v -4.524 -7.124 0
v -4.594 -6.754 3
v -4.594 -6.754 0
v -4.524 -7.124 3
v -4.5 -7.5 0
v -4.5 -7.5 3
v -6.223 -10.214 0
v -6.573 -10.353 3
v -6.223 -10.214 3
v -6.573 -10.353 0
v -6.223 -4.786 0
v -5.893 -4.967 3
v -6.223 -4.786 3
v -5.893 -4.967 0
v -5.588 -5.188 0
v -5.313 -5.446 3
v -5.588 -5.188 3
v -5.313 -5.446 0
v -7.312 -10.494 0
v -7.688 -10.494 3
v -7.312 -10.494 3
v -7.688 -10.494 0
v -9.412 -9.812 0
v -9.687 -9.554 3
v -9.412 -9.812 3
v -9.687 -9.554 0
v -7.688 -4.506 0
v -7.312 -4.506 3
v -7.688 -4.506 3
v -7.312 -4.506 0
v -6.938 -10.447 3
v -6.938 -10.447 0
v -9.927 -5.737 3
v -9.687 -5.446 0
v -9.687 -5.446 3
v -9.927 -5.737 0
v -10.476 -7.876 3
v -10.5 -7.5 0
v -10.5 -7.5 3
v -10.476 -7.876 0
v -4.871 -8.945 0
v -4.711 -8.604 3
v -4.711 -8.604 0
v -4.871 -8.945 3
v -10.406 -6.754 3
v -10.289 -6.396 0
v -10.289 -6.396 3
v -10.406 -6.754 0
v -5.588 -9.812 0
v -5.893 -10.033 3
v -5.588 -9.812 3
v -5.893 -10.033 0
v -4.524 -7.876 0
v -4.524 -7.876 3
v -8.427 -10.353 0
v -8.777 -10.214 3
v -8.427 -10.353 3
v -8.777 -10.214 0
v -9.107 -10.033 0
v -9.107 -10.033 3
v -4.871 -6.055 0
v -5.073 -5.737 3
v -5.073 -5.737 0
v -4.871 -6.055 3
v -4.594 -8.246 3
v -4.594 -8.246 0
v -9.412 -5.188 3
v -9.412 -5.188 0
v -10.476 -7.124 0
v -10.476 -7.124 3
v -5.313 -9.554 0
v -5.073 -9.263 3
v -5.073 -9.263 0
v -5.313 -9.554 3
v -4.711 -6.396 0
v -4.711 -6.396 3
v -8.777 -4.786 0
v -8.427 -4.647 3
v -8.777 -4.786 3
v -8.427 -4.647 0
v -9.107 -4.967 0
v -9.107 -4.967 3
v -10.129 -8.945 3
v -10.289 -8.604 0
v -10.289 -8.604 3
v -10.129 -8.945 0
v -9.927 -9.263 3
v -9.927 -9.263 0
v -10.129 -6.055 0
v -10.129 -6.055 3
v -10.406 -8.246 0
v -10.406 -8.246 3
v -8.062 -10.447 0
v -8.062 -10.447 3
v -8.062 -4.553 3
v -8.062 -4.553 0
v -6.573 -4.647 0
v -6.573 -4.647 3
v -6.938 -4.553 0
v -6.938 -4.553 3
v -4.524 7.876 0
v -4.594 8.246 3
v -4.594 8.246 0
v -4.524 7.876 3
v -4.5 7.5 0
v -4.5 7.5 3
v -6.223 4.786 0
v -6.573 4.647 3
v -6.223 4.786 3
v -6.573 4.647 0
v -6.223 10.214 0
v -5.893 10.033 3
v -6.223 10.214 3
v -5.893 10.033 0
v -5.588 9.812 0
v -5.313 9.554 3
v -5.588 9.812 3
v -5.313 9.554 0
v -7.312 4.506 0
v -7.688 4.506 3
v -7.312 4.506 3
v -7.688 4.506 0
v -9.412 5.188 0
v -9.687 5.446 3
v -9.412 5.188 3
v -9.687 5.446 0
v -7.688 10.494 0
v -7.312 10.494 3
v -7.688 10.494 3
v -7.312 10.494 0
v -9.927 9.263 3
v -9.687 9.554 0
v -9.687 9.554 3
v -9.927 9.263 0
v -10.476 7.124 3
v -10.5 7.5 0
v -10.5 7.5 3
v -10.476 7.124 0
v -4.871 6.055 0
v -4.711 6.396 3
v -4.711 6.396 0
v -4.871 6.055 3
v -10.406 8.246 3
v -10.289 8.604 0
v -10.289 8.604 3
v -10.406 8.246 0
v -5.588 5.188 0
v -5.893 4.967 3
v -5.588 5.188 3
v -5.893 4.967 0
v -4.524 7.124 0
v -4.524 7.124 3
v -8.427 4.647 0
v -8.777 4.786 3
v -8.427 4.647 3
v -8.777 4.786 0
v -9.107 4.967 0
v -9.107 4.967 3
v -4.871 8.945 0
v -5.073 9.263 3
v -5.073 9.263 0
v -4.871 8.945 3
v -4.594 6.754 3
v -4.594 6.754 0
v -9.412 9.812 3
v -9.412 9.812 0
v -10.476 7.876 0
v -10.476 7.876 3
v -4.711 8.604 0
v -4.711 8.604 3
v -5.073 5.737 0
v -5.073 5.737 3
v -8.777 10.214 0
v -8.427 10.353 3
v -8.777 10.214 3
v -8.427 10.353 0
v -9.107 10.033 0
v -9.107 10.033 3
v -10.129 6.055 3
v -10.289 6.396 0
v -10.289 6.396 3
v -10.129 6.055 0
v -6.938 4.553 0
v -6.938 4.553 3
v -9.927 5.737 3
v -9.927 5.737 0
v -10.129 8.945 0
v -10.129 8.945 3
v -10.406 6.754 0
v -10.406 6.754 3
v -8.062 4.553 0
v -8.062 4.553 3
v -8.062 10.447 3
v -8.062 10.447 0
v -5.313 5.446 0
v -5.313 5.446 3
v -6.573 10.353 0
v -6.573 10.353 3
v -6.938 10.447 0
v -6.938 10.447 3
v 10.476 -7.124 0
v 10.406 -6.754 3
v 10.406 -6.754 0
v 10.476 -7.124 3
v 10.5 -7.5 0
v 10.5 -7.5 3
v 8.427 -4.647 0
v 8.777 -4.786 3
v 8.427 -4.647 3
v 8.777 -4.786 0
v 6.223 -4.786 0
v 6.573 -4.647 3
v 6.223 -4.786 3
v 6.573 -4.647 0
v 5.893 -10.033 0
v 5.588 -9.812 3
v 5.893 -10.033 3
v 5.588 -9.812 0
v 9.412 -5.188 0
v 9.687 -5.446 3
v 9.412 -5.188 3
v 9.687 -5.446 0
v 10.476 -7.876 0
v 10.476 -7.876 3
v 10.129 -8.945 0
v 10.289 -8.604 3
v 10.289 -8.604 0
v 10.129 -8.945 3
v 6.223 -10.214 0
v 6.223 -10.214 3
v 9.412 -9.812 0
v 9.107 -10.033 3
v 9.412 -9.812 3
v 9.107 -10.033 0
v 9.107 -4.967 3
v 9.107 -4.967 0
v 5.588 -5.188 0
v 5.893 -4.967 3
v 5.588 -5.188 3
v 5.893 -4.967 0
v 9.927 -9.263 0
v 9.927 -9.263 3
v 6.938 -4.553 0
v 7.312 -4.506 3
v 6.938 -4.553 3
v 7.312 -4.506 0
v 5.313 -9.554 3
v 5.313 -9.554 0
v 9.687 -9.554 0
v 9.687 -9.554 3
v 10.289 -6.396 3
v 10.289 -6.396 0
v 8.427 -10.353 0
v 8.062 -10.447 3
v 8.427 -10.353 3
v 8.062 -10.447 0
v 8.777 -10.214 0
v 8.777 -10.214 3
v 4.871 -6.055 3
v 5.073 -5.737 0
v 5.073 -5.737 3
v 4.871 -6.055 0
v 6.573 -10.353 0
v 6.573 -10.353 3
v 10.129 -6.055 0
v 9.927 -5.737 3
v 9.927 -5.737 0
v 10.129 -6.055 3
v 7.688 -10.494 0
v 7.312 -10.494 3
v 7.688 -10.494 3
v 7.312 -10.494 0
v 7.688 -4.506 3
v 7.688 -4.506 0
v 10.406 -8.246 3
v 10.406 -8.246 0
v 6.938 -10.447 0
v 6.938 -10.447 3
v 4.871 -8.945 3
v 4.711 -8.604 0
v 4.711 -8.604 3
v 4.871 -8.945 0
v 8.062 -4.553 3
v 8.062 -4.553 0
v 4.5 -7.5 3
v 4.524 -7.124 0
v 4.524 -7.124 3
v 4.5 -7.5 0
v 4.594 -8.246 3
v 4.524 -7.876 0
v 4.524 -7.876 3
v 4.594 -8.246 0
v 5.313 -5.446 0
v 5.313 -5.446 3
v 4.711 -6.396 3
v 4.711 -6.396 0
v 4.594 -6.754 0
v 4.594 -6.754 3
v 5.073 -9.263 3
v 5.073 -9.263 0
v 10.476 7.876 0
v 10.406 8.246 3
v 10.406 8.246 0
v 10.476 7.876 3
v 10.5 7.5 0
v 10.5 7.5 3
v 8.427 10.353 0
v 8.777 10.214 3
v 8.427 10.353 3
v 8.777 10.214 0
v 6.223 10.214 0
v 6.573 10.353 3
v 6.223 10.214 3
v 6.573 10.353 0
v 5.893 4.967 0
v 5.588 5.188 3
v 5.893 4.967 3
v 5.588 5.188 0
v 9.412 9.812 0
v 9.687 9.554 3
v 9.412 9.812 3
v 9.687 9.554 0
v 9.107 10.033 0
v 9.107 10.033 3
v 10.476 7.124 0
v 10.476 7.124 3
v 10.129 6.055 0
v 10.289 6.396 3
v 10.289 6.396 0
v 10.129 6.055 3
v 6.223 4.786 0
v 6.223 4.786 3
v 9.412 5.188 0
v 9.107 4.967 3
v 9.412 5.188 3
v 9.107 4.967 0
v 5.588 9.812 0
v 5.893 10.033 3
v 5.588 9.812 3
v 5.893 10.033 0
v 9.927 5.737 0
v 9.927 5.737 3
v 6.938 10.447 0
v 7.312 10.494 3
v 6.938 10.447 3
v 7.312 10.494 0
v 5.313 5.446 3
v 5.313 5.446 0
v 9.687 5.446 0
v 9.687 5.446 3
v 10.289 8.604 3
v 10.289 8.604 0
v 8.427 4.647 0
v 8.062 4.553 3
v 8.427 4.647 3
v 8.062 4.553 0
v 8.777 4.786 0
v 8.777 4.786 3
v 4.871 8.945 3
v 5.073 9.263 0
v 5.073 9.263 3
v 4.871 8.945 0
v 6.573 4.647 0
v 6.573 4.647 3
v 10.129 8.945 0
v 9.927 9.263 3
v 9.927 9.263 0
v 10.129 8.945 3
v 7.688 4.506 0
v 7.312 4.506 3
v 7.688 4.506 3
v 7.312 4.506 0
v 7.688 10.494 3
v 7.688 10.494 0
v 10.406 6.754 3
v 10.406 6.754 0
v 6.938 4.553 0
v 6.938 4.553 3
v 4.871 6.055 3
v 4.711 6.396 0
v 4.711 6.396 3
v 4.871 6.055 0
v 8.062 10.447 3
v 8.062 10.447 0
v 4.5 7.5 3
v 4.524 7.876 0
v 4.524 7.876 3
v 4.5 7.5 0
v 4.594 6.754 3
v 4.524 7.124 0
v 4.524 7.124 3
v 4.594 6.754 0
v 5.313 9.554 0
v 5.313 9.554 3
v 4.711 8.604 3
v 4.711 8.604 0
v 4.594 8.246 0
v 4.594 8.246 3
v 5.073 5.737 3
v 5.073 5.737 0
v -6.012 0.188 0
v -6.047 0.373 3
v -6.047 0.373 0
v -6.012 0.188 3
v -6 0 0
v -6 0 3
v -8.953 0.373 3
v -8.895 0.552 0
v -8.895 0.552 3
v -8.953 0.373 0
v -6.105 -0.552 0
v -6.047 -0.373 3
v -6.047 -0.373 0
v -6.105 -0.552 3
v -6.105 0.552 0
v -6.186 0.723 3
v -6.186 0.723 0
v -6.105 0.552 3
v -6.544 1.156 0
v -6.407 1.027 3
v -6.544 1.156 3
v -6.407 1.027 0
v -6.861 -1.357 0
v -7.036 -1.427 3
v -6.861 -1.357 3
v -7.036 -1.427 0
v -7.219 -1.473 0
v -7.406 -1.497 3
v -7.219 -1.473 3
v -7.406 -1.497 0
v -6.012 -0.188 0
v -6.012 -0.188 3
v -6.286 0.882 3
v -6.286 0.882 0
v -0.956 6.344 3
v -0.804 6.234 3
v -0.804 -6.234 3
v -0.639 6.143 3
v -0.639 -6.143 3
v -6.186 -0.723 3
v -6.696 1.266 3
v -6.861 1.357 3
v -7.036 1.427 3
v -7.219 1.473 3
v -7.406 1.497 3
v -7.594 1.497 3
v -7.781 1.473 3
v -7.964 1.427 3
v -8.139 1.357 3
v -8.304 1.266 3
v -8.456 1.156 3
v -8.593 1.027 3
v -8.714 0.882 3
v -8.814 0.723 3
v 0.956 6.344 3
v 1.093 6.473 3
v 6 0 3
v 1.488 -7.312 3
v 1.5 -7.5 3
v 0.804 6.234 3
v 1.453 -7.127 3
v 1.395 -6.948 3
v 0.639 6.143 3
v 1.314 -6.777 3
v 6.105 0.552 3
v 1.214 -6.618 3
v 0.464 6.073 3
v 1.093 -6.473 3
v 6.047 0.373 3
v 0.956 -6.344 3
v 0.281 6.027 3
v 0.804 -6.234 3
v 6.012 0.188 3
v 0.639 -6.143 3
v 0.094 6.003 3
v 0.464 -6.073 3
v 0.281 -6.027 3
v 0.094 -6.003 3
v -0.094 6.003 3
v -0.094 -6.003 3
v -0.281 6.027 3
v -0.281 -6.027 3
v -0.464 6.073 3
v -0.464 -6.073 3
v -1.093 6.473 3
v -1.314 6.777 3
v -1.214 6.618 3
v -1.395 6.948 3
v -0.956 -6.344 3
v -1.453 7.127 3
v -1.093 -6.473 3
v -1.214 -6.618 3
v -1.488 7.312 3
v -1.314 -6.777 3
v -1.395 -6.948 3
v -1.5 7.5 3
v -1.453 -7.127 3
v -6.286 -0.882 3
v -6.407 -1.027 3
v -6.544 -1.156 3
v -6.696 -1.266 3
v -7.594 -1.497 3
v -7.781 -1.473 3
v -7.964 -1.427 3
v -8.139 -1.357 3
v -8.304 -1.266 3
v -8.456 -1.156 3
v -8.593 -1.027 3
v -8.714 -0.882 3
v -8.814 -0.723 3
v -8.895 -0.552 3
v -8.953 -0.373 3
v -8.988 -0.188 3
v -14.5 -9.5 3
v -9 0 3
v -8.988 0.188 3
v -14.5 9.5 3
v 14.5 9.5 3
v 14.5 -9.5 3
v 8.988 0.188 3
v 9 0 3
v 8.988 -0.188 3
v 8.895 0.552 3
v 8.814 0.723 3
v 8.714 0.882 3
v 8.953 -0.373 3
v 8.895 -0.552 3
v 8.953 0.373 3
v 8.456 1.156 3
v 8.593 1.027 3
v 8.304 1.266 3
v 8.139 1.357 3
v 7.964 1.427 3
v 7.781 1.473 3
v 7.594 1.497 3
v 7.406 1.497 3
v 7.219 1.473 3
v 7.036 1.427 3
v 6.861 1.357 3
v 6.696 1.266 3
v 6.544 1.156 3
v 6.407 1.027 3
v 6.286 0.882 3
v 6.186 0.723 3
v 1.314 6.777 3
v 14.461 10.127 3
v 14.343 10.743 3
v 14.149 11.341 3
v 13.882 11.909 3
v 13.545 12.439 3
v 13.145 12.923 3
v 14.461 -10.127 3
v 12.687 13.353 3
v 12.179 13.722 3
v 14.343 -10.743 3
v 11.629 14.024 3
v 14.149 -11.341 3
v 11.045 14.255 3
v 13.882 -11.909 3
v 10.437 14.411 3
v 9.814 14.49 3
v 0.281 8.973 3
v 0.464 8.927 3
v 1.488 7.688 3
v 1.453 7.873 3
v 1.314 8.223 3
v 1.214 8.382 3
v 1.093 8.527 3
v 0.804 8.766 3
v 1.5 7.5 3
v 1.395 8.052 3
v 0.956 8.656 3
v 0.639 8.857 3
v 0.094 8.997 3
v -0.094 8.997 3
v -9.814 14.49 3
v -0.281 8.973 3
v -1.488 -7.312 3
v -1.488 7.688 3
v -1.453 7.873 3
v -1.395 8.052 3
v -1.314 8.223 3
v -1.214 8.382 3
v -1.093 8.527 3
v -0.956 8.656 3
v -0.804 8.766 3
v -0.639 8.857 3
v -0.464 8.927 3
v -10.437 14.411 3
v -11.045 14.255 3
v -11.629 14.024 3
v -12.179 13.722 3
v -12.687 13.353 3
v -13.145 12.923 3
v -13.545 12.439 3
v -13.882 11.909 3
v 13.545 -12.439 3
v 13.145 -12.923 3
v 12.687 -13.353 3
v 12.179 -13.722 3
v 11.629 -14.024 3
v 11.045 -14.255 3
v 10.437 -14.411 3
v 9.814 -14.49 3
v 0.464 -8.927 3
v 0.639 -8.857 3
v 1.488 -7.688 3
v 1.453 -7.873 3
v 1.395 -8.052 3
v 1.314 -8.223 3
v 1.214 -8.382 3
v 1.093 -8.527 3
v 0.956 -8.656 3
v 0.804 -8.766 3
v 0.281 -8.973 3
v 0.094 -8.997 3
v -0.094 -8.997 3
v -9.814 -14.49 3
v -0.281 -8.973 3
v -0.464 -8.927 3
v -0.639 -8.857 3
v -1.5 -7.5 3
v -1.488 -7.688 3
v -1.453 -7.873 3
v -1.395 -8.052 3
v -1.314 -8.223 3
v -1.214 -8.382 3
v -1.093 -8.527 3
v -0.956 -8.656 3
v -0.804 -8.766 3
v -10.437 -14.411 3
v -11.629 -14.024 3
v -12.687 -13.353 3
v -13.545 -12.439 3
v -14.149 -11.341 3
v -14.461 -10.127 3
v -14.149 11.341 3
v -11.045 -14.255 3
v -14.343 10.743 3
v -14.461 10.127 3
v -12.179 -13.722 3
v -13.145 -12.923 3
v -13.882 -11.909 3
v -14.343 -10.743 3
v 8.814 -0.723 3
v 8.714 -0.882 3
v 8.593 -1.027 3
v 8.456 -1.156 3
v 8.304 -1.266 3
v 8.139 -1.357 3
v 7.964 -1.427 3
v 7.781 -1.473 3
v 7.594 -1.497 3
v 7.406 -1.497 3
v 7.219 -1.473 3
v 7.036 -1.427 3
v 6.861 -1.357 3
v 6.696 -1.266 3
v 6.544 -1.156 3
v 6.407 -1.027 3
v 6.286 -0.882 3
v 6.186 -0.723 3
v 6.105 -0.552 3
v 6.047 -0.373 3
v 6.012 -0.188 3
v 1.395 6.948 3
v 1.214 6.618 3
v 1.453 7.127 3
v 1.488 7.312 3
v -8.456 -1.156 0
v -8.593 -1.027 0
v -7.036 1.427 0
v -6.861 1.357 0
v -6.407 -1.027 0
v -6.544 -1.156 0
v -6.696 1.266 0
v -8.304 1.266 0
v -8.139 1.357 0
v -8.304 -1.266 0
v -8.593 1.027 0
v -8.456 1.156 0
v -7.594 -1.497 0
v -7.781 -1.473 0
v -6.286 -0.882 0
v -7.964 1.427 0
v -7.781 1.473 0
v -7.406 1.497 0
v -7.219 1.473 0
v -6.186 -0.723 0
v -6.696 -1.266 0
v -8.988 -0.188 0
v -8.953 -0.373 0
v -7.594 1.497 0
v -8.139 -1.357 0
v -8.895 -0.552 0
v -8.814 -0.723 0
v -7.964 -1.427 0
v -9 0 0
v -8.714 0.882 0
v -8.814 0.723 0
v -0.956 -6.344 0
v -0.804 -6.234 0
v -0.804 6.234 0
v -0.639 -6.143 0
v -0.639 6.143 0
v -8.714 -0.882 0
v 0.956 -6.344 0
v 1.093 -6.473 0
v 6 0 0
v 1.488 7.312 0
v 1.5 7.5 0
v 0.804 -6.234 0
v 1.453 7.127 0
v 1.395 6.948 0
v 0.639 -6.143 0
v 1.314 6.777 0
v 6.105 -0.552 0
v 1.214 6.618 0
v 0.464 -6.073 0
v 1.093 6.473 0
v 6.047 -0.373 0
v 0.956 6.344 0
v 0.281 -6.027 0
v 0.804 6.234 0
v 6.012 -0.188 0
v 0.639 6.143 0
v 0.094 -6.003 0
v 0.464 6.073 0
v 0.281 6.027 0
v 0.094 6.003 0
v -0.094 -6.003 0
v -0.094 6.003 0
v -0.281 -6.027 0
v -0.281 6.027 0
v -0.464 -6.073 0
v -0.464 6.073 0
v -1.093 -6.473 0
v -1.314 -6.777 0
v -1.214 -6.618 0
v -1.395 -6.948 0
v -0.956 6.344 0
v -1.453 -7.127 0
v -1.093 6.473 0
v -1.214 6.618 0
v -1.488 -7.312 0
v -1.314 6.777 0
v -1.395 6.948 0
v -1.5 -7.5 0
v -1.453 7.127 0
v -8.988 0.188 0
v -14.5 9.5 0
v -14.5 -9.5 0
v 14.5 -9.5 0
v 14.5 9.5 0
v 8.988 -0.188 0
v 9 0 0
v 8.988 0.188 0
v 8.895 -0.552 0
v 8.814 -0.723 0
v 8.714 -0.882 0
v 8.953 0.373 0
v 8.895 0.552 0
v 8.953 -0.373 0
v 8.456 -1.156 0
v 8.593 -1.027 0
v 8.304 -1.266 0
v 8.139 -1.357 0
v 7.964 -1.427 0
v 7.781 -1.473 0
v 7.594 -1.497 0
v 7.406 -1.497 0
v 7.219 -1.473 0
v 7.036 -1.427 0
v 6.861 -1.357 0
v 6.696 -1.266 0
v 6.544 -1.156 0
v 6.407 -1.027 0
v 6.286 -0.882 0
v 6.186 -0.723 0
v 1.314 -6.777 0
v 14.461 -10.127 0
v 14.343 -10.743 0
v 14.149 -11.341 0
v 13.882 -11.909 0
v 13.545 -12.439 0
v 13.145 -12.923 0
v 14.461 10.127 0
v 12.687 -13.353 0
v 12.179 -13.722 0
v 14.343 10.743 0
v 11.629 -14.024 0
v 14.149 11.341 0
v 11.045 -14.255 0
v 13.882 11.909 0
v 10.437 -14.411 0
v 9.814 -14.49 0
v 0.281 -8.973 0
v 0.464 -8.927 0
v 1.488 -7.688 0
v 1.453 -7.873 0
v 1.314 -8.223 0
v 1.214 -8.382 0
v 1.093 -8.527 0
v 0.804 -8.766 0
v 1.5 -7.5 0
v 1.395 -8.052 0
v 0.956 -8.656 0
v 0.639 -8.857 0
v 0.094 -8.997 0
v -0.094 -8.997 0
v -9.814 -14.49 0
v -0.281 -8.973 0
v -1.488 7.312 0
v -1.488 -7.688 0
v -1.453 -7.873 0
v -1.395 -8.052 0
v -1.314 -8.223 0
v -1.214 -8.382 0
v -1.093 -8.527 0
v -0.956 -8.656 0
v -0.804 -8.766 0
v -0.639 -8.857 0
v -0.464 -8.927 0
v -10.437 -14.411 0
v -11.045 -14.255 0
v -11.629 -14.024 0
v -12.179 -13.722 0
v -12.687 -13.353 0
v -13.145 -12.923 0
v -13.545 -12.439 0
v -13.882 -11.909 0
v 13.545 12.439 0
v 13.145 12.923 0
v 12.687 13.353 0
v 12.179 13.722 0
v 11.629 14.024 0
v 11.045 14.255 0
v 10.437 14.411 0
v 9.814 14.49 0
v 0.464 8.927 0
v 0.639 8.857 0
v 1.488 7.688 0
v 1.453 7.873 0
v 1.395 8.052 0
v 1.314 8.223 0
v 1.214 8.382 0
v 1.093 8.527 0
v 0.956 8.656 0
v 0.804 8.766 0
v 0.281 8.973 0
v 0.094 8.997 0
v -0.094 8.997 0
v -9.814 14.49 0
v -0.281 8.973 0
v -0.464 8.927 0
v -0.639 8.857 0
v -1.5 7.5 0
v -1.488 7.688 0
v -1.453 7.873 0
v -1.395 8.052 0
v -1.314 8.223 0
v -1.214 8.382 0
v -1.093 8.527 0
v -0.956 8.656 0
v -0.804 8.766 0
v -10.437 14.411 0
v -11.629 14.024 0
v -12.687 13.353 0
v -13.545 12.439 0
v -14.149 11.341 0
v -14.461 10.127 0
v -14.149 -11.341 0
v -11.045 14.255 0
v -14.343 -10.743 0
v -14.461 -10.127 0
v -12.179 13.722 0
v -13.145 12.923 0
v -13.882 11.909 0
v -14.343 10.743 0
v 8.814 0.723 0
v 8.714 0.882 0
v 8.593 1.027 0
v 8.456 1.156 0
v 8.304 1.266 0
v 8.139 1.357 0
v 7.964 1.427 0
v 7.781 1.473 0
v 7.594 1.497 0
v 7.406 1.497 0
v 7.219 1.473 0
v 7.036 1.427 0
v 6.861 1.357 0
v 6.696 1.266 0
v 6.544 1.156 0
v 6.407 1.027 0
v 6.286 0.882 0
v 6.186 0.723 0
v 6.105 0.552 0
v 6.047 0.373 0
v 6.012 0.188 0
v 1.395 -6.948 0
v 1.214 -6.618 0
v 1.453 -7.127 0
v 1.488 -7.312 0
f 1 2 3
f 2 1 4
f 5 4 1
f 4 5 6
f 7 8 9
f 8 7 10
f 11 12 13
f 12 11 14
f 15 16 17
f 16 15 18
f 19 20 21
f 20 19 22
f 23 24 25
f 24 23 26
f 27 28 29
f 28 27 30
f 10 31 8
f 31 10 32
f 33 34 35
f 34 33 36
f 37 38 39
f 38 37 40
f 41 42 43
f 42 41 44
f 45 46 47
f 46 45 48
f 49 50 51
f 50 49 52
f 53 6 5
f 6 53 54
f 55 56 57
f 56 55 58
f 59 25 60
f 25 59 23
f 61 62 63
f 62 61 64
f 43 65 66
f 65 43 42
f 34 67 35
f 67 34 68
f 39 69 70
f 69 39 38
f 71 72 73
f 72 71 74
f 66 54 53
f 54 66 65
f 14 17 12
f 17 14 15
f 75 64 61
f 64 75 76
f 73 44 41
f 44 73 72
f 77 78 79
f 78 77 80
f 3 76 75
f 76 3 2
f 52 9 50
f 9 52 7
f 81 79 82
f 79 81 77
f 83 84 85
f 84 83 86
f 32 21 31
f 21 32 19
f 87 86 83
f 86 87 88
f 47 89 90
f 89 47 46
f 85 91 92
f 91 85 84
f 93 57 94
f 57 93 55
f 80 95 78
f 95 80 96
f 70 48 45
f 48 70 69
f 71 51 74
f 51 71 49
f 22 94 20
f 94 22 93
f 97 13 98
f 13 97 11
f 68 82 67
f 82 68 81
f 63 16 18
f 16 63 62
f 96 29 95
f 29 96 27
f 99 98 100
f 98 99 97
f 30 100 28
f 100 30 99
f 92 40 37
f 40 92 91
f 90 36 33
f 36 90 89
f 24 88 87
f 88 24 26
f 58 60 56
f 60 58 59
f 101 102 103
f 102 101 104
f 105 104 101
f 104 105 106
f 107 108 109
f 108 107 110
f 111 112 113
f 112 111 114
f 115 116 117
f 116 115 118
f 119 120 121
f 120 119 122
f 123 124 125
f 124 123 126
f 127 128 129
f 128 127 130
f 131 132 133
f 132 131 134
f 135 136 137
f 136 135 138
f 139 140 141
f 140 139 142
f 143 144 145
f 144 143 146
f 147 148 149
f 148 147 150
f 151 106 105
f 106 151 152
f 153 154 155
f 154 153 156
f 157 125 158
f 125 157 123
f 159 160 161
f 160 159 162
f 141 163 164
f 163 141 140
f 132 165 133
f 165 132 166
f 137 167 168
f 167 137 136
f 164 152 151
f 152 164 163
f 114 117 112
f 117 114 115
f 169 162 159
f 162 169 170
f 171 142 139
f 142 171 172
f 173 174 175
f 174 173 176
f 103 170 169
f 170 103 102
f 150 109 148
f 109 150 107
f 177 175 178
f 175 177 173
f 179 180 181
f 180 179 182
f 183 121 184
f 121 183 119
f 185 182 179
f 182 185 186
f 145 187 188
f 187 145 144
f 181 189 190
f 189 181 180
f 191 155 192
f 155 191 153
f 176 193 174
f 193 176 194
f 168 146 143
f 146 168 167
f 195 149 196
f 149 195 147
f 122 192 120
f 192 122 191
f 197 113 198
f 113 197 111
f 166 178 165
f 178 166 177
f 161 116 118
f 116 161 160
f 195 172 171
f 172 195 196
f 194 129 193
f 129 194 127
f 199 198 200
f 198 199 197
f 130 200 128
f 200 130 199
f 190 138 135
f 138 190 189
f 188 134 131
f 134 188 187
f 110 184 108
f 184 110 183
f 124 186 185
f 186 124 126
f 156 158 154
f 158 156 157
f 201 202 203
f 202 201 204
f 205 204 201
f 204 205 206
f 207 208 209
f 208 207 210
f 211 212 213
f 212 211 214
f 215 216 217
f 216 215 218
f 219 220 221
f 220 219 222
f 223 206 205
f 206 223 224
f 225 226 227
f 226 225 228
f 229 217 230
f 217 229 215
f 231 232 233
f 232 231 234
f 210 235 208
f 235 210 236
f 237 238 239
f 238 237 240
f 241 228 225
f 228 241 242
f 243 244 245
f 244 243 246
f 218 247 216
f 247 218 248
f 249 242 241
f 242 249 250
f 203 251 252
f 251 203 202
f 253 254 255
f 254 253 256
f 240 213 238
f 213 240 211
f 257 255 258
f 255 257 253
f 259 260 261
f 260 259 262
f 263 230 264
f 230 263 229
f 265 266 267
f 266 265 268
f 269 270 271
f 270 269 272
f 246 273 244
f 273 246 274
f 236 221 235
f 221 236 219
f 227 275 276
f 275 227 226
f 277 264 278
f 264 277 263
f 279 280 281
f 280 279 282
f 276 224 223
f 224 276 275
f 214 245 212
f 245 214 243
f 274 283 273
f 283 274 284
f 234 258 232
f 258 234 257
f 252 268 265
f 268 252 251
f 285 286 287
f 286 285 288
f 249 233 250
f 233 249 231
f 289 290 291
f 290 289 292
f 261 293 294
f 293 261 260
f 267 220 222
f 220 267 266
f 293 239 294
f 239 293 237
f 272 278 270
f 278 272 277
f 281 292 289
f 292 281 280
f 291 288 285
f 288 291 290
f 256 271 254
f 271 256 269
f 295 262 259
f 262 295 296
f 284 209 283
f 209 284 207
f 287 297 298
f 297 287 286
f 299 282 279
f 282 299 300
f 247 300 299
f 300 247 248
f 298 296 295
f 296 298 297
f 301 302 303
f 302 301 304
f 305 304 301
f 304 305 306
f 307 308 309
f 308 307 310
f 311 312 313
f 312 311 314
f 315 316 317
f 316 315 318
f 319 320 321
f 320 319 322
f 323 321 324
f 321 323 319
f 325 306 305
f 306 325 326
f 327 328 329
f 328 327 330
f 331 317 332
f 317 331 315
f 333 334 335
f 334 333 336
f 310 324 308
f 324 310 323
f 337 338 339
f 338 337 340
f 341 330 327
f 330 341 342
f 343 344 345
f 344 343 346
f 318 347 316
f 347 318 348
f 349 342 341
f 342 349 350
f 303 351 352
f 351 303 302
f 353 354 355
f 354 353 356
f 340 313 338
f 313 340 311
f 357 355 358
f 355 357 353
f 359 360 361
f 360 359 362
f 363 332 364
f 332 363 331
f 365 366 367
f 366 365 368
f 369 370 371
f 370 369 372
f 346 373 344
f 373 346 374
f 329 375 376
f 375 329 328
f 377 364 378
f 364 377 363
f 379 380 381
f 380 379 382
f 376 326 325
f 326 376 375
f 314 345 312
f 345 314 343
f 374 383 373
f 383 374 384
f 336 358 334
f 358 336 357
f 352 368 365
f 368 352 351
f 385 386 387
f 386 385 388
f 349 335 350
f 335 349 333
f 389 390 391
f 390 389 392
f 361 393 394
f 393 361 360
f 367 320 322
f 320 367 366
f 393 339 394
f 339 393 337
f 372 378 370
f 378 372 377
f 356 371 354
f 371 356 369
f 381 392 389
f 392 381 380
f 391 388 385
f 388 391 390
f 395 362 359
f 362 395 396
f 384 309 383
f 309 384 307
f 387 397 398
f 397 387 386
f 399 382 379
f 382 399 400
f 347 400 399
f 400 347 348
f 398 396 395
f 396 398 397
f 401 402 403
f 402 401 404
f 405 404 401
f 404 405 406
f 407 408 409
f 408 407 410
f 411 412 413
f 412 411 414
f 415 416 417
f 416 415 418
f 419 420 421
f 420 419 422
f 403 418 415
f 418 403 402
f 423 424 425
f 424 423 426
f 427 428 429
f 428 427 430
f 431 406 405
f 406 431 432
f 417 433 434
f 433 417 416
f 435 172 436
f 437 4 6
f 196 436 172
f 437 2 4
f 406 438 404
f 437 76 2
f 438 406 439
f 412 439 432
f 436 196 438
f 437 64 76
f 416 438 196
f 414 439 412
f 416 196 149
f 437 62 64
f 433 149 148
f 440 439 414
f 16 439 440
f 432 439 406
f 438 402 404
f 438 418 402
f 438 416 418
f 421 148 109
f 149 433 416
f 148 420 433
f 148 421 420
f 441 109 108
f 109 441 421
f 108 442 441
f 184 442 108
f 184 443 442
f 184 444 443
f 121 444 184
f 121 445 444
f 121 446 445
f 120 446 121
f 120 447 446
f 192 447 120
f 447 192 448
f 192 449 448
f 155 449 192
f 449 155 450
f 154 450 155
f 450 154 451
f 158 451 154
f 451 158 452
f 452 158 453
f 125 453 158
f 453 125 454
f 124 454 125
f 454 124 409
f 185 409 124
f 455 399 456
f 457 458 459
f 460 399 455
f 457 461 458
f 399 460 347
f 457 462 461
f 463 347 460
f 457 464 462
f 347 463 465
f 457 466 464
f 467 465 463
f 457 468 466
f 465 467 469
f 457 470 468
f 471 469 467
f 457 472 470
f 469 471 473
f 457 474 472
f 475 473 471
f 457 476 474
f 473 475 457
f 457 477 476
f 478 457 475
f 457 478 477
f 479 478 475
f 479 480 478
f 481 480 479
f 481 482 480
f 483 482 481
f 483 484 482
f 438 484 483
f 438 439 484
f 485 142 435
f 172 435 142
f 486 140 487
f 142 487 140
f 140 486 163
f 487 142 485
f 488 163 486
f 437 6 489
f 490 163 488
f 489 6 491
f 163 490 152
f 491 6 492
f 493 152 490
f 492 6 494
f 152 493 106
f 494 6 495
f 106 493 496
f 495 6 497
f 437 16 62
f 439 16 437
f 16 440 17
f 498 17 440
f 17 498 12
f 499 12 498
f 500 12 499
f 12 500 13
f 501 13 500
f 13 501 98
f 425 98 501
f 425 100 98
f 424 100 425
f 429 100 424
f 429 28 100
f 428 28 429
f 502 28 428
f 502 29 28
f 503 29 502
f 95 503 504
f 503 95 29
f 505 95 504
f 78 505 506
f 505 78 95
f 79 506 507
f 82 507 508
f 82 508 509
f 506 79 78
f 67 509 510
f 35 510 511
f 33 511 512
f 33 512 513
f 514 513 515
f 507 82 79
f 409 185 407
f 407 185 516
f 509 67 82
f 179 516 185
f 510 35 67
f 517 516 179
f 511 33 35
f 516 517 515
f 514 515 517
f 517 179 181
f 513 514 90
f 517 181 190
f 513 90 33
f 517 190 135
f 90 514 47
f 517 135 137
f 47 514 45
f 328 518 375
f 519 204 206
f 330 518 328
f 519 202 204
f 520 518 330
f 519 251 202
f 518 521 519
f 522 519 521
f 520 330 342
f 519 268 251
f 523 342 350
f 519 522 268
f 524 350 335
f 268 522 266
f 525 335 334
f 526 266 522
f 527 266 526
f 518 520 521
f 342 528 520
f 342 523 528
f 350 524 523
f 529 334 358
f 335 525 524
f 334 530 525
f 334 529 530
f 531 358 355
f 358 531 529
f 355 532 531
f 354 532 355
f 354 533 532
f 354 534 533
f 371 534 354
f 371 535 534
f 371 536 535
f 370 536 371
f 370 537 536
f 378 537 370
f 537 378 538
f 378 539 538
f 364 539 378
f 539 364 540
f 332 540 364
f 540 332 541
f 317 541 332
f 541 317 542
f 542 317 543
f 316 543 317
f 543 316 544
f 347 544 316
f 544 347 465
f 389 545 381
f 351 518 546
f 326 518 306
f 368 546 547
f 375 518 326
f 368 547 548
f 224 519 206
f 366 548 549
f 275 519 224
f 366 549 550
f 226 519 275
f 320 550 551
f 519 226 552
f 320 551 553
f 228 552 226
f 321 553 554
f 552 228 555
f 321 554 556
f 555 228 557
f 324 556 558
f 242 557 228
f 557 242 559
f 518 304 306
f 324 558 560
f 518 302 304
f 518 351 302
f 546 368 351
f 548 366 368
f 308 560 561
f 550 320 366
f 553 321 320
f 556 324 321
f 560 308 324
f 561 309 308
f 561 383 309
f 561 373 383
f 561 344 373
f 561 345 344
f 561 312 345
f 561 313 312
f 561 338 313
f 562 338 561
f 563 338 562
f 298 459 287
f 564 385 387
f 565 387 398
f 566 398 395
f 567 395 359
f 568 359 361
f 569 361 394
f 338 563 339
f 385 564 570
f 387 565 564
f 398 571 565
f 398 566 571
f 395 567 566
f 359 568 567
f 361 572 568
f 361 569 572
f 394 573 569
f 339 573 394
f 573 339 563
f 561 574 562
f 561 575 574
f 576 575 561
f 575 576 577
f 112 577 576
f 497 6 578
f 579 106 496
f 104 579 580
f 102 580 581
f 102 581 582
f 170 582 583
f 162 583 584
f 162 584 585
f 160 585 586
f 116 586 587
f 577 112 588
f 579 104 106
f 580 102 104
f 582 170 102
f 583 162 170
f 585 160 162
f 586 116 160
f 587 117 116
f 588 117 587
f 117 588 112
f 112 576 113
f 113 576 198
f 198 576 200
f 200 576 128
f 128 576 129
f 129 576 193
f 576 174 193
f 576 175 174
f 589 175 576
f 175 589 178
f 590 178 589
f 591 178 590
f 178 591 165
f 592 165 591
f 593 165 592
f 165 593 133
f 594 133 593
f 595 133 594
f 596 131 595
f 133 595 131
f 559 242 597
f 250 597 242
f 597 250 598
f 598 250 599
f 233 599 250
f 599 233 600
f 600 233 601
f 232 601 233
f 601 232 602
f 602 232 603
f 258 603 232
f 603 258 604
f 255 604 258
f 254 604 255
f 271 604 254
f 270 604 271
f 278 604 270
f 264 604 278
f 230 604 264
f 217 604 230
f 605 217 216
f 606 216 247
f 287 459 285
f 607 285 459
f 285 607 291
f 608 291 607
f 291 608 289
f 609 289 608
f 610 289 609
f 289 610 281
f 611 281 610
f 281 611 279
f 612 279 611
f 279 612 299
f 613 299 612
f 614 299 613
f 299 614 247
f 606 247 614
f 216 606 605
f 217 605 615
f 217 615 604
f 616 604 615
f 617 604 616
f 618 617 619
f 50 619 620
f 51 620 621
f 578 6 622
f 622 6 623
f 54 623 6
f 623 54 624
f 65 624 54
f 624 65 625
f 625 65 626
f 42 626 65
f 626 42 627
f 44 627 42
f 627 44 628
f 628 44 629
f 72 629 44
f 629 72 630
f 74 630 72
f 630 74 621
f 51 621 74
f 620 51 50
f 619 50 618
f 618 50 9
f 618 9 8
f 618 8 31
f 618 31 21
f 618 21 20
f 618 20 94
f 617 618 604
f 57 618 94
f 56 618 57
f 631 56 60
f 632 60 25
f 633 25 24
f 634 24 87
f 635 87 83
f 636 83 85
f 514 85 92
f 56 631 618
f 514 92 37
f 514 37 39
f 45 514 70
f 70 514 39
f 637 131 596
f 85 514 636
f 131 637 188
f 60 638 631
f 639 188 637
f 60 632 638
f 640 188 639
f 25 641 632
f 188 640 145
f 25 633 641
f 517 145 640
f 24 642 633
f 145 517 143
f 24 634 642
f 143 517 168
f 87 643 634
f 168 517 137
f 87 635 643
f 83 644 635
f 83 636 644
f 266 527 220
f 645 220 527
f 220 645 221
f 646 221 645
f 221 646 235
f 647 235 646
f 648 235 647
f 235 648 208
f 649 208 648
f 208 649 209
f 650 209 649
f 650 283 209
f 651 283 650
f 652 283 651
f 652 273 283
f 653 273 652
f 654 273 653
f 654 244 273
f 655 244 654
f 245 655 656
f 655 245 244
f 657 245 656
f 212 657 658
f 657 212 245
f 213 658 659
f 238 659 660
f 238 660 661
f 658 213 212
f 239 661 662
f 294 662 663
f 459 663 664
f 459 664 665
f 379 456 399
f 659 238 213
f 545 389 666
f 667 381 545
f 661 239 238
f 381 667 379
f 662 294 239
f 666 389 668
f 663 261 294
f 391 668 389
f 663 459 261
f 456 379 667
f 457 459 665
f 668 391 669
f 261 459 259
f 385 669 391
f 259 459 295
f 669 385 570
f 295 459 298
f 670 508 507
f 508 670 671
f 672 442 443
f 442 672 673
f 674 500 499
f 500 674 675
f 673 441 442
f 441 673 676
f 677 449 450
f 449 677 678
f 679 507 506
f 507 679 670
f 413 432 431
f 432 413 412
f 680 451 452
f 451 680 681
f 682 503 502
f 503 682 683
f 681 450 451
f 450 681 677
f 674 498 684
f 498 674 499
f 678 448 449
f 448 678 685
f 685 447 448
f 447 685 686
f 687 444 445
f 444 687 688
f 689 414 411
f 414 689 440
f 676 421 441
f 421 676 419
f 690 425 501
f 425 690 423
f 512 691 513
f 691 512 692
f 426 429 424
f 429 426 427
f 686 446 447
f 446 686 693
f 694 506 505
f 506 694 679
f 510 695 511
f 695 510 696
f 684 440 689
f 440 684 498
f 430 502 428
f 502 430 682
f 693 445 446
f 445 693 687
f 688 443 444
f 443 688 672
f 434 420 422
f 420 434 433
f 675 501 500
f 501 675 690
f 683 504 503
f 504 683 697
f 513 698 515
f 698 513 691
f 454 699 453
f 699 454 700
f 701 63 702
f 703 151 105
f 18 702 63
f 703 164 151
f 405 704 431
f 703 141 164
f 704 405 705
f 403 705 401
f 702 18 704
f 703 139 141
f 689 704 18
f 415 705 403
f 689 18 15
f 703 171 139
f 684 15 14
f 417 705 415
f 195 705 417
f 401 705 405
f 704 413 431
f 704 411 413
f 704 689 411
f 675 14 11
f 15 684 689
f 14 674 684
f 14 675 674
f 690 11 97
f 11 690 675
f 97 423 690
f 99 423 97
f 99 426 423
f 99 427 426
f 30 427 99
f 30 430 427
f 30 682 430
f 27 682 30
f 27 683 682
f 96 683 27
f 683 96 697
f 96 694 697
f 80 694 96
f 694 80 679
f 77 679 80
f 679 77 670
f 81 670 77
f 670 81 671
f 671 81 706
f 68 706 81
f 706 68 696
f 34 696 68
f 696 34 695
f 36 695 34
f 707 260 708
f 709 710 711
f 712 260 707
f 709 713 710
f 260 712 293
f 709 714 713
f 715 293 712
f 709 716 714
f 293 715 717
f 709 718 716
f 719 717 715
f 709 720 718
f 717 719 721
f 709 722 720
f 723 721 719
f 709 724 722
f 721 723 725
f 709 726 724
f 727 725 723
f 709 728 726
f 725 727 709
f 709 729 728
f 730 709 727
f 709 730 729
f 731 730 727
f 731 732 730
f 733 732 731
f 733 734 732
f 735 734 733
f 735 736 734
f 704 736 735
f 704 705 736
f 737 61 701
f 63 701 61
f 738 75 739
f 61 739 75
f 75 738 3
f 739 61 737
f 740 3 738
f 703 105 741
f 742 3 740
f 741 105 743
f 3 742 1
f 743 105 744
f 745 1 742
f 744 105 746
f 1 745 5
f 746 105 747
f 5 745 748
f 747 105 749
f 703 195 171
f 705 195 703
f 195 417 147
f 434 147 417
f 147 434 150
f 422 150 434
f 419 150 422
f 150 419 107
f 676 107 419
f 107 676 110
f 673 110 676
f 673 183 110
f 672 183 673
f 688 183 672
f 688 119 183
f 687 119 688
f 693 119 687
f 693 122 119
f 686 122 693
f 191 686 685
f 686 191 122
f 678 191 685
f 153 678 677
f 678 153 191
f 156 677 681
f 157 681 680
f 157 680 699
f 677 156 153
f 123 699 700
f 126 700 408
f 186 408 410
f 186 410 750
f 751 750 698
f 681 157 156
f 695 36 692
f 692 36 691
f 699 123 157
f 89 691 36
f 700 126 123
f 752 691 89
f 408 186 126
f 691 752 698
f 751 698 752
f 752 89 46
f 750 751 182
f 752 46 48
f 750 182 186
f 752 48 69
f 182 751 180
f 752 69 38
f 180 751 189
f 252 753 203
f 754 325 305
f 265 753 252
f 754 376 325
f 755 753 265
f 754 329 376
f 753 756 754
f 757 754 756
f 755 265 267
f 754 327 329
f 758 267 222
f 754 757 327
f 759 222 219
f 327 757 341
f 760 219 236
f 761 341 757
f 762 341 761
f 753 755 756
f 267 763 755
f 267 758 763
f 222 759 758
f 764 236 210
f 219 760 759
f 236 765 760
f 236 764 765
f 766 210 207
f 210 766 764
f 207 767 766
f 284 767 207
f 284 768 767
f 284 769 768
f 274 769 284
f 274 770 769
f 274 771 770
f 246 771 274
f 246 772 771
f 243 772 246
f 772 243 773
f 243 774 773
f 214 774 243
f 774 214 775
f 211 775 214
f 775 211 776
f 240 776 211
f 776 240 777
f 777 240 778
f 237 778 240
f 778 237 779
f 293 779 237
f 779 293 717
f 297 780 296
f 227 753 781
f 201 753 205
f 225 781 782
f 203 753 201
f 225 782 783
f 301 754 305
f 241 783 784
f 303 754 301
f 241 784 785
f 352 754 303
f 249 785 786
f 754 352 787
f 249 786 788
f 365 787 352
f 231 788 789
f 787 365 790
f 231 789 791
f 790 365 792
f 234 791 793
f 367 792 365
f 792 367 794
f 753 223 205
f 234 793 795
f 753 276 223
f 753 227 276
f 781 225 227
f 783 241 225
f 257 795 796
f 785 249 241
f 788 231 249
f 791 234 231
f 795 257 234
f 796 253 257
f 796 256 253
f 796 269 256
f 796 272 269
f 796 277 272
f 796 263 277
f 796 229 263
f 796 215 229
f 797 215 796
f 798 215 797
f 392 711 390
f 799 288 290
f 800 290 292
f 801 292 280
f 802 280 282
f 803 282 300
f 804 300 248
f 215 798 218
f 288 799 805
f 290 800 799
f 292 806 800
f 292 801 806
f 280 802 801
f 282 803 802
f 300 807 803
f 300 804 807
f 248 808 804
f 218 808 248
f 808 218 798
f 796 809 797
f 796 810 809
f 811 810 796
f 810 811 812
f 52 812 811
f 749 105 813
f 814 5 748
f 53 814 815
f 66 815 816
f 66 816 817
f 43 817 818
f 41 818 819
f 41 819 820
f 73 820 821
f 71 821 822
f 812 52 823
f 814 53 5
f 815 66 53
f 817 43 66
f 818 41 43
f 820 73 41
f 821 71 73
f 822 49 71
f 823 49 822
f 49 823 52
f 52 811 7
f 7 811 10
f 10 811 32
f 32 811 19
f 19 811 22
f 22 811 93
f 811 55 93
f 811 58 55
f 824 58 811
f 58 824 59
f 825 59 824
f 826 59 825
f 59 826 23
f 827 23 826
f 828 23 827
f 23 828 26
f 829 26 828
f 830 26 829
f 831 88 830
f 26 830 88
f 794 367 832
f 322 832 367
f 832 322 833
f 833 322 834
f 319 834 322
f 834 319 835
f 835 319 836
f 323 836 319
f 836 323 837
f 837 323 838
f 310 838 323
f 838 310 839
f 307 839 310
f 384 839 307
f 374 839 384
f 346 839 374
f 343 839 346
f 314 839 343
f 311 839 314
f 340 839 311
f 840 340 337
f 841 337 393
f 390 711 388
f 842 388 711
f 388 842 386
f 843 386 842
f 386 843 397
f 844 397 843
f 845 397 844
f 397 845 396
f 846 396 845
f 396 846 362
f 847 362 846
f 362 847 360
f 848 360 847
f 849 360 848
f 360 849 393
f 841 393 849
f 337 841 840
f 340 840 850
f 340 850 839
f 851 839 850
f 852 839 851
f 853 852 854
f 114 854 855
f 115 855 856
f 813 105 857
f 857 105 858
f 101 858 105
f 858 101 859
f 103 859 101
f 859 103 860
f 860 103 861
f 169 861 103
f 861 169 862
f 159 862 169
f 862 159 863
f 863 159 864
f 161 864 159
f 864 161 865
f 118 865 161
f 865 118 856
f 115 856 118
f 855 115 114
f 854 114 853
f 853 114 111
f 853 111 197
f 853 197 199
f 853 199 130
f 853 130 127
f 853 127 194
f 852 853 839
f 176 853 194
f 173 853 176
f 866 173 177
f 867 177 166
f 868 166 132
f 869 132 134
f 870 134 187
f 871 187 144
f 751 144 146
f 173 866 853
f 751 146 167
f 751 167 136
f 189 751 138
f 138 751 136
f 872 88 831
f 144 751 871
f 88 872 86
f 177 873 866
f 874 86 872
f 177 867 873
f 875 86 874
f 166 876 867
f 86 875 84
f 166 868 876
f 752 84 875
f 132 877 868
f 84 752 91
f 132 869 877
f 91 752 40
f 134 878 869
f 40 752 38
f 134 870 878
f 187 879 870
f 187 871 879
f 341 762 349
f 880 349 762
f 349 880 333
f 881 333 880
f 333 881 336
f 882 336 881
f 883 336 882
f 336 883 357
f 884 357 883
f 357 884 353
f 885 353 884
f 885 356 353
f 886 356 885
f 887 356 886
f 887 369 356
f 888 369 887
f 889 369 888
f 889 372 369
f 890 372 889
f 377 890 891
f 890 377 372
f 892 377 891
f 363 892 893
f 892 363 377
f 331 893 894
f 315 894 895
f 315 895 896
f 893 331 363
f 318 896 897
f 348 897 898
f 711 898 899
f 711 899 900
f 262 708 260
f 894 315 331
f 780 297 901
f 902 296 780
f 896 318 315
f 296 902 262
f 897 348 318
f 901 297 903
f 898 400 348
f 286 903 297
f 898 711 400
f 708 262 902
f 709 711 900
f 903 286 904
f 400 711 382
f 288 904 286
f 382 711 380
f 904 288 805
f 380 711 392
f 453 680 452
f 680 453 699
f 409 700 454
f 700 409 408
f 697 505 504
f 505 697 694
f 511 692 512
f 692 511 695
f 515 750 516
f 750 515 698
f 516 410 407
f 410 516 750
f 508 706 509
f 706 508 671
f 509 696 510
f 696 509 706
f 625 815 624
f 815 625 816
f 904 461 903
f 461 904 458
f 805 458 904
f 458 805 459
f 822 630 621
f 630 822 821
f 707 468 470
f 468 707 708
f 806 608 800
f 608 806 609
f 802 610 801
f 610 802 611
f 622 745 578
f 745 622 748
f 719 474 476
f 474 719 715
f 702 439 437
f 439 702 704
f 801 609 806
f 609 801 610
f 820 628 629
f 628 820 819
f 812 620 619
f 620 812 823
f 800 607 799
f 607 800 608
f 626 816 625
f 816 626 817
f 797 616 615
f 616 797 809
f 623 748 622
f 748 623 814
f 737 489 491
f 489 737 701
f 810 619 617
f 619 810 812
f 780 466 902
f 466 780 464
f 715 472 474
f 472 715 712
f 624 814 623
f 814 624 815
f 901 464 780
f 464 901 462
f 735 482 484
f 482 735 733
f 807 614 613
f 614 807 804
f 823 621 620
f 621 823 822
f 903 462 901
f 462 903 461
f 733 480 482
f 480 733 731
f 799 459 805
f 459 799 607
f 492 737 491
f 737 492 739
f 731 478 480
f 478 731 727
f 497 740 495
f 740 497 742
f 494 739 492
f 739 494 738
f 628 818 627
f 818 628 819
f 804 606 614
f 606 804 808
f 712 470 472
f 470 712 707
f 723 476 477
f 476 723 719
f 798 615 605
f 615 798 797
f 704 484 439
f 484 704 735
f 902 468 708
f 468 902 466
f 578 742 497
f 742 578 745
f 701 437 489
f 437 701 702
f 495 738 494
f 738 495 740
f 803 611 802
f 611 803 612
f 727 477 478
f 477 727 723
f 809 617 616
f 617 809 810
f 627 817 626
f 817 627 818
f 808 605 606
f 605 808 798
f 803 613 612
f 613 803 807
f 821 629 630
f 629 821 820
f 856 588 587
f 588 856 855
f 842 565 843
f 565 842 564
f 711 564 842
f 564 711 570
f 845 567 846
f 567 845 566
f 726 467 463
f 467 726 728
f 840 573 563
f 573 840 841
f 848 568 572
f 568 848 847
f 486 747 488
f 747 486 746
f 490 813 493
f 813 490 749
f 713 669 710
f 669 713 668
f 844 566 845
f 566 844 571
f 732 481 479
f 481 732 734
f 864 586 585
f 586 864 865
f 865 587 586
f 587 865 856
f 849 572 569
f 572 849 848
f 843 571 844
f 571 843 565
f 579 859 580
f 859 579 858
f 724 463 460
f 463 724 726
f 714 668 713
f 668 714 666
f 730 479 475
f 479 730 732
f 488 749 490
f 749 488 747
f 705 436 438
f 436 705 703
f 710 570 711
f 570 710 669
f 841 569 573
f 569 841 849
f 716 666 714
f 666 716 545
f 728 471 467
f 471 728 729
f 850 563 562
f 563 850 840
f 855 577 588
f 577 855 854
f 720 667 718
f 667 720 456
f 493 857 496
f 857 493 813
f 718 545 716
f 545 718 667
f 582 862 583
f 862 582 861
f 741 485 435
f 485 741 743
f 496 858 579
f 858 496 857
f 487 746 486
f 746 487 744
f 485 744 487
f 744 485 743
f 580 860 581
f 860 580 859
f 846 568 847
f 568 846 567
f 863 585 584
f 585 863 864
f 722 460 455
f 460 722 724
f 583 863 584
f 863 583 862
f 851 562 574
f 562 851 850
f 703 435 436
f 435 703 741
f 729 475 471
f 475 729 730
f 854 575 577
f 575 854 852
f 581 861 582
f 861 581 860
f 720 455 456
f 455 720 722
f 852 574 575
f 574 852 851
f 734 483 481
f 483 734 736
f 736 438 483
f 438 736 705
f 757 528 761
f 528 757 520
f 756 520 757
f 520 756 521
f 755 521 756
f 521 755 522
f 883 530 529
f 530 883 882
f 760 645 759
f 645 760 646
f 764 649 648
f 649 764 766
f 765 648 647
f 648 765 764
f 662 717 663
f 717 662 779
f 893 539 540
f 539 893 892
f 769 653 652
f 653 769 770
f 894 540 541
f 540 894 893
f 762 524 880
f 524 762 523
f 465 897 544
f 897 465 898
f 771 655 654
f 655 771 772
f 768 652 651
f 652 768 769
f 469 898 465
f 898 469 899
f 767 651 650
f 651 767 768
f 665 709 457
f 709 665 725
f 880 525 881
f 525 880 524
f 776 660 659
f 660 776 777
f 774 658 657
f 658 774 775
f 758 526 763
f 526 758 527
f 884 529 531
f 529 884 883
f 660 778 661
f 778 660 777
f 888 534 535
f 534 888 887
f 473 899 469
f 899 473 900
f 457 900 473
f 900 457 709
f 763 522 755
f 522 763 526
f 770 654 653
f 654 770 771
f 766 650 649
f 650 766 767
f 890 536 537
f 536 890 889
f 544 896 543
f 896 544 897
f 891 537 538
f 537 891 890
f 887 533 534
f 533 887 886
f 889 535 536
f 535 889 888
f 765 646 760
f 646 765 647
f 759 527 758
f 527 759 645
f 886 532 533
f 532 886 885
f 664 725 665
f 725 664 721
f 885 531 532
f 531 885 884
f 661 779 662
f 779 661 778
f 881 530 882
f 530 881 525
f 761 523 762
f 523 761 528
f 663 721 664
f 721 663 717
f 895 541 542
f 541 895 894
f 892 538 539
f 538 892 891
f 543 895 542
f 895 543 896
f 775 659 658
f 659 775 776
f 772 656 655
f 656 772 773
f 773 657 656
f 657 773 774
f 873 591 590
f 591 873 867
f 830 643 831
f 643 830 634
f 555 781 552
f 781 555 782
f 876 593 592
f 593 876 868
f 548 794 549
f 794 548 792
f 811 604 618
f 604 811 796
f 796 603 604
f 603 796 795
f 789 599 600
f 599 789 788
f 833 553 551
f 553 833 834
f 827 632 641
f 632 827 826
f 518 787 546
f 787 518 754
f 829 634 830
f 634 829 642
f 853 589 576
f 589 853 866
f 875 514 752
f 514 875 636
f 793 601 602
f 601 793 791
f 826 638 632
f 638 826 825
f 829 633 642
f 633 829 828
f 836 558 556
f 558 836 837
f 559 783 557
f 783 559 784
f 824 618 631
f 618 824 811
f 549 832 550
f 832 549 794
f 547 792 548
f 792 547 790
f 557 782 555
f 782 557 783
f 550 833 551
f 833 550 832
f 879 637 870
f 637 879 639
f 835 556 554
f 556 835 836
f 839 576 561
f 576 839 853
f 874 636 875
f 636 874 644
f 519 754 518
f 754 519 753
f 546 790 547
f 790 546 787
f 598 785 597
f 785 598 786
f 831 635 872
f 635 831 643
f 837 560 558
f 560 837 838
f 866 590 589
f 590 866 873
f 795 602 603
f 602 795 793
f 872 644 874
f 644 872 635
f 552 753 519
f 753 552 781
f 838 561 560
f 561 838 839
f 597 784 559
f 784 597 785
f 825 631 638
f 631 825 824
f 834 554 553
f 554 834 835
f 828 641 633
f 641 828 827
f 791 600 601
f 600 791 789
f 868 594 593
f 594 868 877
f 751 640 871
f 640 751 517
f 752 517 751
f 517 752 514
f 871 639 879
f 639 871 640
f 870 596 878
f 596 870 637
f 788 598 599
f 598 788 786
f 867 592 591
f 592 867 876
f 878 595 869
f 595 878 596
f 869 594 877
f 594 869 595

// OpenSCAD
$fn = 50;


difference() {
	union() {
		hull() {
			translate(v = [-9.5000000000, 9.5000000000, 0]) {
				cylinder(h = 3, r = 5);
			}
			translate(v = [9.5000000000, 9.5000000000, 0]) {
				cylinder(h = 3, r = 5);
			}
			translate(v = [-9.5000000000, -9.5000000000, 0]) {
				cylinder(h = 3, r = 5);
			}
			translate(v = [9.5000000000, -9.5000000000, 0]) {
				cylinder(h = 3, r = 5);
			}
		}
	}
	union() {
		translate(v = [-7.5000000000, -7.5000000000, -100.0000000000]) {
			cylinder(h = 200, r = 3.0000000000);
		}
		translate(v = [-7.5000000000, 7.5000000000, -100.0000000000]) {
			cylinder(h = 200, r = 3.0000000000);
		}
		translate(v = [7.5000000000, -7.5000000000, -100.0000000000]) {
			cylinder(h = 200, r = 3.0000000000);
		}
		translate(v = [7.5000000000, 7.5000000000, -100.0000000000]) {
			cylinder(h = 200, r = 3.0000000000);
		}
		translate(v = [-7.5000000000, -7.5000000000, 0]) {
			cylinder(h = 3, r = 1.5000000000);
		}
		translate(v = [-7.5000000000, 0.0000000000, 0]) {
			cylinder(h = 3, r = 1.5000000000);
		}
		translate(v = [-7.5000000000, 7.5000000000, 0]) {
			cylinder(h = 3, r = 1.5000000000);
		}
		translate(v = [0.0000000000, -7.5000000000, 0]) {
			cylinder(h = 3, r = 1.5000000000);
		}
		translate(v = [0.0000000000, 7.5000000000, 0]) {
			cylinder(h = 3, r = 1.5000000000);
		}
		translate(v = [7.5000000000, -7.5000000000, 0]) {
			cylinder(h = 3, r = 1.5000000000);
		}
		translate(v = [7.5000000000, 0.0000000000, 0]) {
			cylinder(h = 3, r = 1.5000000000);
		}
		translate(v = [7.5000000000, 7.5000000000, 0]) {
			cylinder(h = 3, r = 1.5000000000);
		}
		translate(v = [-7.5000000000, -7.5000000000, 0]) {
			cylinder(h = 3, r = 1.5000000000);
		}
		translate(v = [-7.5000000000, 0.0000000000, 0]) {
			cylinder(h = 3, r = 1.5000000000);
		}
		translate(v = [-7.5000000000, 7.5000000000, 0]) {
			cylinder(h = 3, r = 1.5000000000);
		}
		translate(v = [0.0000000000, -7.5000000000, 0]) {
			cylinder(h = 3, r = 1.5000000000);
		}
		translate(v = [0.0000000000, 7.5000000000, 0]) {
			cylinder(h = 3, r = 1.5000000000);
		}
		translate(v = [7.5000000000, -7.5000000000, 0]) {
			cylinder(h = 3, r = 1.5000000000);
		}
		translate(v = [7.5000000000, 0.0000000000, 0]) {
			cylinder(h = 3, r = 1.5000000000);
		}
		translate(v = [7.5000000000, 7.5000000000, 0]) {
			cylinder(h = 3, r = 1.5000000000);
		}
		translate(v = [-7.5000000000, -7.5000000000, 0]) {
			cylinder(h = 3, r = 1.5000000000);
		}
		translate(v = [-7.5000000000, 0.0000000000, 0]) {
			cylinder(h = 3, r = 1.5000000000);
		}
		translate(v = [-7.5000000000, 7.5000000000, 0]) {
			cylinder(h = 3, r = 1.5000000000);
		}
		translate(v = [0.0000000000, -7.5000000000, 0]) {
			cylinder(h = 3, r = 1.5000000000);
		}
		translate(v = [0.0000000000, 7.5000000000, 0]) {
			cylinder(h = 3, r = 1.5000000000);
		}
		translate(v = [7.5000000000, -7.5000000000, 0]) {
			cylinder(h = 3, r = 1.5000000000);
		}
		translate(v = [7.5000000000, 0.0000000000, 0]) {
			cylinder(h = 3, r = 1.5000000000);
		}
		translate(v = [7.5000000000, 7.5000000000, 0]) {
			cylinder(h = 3, r = 1.5000000000);
		}
	}
}
